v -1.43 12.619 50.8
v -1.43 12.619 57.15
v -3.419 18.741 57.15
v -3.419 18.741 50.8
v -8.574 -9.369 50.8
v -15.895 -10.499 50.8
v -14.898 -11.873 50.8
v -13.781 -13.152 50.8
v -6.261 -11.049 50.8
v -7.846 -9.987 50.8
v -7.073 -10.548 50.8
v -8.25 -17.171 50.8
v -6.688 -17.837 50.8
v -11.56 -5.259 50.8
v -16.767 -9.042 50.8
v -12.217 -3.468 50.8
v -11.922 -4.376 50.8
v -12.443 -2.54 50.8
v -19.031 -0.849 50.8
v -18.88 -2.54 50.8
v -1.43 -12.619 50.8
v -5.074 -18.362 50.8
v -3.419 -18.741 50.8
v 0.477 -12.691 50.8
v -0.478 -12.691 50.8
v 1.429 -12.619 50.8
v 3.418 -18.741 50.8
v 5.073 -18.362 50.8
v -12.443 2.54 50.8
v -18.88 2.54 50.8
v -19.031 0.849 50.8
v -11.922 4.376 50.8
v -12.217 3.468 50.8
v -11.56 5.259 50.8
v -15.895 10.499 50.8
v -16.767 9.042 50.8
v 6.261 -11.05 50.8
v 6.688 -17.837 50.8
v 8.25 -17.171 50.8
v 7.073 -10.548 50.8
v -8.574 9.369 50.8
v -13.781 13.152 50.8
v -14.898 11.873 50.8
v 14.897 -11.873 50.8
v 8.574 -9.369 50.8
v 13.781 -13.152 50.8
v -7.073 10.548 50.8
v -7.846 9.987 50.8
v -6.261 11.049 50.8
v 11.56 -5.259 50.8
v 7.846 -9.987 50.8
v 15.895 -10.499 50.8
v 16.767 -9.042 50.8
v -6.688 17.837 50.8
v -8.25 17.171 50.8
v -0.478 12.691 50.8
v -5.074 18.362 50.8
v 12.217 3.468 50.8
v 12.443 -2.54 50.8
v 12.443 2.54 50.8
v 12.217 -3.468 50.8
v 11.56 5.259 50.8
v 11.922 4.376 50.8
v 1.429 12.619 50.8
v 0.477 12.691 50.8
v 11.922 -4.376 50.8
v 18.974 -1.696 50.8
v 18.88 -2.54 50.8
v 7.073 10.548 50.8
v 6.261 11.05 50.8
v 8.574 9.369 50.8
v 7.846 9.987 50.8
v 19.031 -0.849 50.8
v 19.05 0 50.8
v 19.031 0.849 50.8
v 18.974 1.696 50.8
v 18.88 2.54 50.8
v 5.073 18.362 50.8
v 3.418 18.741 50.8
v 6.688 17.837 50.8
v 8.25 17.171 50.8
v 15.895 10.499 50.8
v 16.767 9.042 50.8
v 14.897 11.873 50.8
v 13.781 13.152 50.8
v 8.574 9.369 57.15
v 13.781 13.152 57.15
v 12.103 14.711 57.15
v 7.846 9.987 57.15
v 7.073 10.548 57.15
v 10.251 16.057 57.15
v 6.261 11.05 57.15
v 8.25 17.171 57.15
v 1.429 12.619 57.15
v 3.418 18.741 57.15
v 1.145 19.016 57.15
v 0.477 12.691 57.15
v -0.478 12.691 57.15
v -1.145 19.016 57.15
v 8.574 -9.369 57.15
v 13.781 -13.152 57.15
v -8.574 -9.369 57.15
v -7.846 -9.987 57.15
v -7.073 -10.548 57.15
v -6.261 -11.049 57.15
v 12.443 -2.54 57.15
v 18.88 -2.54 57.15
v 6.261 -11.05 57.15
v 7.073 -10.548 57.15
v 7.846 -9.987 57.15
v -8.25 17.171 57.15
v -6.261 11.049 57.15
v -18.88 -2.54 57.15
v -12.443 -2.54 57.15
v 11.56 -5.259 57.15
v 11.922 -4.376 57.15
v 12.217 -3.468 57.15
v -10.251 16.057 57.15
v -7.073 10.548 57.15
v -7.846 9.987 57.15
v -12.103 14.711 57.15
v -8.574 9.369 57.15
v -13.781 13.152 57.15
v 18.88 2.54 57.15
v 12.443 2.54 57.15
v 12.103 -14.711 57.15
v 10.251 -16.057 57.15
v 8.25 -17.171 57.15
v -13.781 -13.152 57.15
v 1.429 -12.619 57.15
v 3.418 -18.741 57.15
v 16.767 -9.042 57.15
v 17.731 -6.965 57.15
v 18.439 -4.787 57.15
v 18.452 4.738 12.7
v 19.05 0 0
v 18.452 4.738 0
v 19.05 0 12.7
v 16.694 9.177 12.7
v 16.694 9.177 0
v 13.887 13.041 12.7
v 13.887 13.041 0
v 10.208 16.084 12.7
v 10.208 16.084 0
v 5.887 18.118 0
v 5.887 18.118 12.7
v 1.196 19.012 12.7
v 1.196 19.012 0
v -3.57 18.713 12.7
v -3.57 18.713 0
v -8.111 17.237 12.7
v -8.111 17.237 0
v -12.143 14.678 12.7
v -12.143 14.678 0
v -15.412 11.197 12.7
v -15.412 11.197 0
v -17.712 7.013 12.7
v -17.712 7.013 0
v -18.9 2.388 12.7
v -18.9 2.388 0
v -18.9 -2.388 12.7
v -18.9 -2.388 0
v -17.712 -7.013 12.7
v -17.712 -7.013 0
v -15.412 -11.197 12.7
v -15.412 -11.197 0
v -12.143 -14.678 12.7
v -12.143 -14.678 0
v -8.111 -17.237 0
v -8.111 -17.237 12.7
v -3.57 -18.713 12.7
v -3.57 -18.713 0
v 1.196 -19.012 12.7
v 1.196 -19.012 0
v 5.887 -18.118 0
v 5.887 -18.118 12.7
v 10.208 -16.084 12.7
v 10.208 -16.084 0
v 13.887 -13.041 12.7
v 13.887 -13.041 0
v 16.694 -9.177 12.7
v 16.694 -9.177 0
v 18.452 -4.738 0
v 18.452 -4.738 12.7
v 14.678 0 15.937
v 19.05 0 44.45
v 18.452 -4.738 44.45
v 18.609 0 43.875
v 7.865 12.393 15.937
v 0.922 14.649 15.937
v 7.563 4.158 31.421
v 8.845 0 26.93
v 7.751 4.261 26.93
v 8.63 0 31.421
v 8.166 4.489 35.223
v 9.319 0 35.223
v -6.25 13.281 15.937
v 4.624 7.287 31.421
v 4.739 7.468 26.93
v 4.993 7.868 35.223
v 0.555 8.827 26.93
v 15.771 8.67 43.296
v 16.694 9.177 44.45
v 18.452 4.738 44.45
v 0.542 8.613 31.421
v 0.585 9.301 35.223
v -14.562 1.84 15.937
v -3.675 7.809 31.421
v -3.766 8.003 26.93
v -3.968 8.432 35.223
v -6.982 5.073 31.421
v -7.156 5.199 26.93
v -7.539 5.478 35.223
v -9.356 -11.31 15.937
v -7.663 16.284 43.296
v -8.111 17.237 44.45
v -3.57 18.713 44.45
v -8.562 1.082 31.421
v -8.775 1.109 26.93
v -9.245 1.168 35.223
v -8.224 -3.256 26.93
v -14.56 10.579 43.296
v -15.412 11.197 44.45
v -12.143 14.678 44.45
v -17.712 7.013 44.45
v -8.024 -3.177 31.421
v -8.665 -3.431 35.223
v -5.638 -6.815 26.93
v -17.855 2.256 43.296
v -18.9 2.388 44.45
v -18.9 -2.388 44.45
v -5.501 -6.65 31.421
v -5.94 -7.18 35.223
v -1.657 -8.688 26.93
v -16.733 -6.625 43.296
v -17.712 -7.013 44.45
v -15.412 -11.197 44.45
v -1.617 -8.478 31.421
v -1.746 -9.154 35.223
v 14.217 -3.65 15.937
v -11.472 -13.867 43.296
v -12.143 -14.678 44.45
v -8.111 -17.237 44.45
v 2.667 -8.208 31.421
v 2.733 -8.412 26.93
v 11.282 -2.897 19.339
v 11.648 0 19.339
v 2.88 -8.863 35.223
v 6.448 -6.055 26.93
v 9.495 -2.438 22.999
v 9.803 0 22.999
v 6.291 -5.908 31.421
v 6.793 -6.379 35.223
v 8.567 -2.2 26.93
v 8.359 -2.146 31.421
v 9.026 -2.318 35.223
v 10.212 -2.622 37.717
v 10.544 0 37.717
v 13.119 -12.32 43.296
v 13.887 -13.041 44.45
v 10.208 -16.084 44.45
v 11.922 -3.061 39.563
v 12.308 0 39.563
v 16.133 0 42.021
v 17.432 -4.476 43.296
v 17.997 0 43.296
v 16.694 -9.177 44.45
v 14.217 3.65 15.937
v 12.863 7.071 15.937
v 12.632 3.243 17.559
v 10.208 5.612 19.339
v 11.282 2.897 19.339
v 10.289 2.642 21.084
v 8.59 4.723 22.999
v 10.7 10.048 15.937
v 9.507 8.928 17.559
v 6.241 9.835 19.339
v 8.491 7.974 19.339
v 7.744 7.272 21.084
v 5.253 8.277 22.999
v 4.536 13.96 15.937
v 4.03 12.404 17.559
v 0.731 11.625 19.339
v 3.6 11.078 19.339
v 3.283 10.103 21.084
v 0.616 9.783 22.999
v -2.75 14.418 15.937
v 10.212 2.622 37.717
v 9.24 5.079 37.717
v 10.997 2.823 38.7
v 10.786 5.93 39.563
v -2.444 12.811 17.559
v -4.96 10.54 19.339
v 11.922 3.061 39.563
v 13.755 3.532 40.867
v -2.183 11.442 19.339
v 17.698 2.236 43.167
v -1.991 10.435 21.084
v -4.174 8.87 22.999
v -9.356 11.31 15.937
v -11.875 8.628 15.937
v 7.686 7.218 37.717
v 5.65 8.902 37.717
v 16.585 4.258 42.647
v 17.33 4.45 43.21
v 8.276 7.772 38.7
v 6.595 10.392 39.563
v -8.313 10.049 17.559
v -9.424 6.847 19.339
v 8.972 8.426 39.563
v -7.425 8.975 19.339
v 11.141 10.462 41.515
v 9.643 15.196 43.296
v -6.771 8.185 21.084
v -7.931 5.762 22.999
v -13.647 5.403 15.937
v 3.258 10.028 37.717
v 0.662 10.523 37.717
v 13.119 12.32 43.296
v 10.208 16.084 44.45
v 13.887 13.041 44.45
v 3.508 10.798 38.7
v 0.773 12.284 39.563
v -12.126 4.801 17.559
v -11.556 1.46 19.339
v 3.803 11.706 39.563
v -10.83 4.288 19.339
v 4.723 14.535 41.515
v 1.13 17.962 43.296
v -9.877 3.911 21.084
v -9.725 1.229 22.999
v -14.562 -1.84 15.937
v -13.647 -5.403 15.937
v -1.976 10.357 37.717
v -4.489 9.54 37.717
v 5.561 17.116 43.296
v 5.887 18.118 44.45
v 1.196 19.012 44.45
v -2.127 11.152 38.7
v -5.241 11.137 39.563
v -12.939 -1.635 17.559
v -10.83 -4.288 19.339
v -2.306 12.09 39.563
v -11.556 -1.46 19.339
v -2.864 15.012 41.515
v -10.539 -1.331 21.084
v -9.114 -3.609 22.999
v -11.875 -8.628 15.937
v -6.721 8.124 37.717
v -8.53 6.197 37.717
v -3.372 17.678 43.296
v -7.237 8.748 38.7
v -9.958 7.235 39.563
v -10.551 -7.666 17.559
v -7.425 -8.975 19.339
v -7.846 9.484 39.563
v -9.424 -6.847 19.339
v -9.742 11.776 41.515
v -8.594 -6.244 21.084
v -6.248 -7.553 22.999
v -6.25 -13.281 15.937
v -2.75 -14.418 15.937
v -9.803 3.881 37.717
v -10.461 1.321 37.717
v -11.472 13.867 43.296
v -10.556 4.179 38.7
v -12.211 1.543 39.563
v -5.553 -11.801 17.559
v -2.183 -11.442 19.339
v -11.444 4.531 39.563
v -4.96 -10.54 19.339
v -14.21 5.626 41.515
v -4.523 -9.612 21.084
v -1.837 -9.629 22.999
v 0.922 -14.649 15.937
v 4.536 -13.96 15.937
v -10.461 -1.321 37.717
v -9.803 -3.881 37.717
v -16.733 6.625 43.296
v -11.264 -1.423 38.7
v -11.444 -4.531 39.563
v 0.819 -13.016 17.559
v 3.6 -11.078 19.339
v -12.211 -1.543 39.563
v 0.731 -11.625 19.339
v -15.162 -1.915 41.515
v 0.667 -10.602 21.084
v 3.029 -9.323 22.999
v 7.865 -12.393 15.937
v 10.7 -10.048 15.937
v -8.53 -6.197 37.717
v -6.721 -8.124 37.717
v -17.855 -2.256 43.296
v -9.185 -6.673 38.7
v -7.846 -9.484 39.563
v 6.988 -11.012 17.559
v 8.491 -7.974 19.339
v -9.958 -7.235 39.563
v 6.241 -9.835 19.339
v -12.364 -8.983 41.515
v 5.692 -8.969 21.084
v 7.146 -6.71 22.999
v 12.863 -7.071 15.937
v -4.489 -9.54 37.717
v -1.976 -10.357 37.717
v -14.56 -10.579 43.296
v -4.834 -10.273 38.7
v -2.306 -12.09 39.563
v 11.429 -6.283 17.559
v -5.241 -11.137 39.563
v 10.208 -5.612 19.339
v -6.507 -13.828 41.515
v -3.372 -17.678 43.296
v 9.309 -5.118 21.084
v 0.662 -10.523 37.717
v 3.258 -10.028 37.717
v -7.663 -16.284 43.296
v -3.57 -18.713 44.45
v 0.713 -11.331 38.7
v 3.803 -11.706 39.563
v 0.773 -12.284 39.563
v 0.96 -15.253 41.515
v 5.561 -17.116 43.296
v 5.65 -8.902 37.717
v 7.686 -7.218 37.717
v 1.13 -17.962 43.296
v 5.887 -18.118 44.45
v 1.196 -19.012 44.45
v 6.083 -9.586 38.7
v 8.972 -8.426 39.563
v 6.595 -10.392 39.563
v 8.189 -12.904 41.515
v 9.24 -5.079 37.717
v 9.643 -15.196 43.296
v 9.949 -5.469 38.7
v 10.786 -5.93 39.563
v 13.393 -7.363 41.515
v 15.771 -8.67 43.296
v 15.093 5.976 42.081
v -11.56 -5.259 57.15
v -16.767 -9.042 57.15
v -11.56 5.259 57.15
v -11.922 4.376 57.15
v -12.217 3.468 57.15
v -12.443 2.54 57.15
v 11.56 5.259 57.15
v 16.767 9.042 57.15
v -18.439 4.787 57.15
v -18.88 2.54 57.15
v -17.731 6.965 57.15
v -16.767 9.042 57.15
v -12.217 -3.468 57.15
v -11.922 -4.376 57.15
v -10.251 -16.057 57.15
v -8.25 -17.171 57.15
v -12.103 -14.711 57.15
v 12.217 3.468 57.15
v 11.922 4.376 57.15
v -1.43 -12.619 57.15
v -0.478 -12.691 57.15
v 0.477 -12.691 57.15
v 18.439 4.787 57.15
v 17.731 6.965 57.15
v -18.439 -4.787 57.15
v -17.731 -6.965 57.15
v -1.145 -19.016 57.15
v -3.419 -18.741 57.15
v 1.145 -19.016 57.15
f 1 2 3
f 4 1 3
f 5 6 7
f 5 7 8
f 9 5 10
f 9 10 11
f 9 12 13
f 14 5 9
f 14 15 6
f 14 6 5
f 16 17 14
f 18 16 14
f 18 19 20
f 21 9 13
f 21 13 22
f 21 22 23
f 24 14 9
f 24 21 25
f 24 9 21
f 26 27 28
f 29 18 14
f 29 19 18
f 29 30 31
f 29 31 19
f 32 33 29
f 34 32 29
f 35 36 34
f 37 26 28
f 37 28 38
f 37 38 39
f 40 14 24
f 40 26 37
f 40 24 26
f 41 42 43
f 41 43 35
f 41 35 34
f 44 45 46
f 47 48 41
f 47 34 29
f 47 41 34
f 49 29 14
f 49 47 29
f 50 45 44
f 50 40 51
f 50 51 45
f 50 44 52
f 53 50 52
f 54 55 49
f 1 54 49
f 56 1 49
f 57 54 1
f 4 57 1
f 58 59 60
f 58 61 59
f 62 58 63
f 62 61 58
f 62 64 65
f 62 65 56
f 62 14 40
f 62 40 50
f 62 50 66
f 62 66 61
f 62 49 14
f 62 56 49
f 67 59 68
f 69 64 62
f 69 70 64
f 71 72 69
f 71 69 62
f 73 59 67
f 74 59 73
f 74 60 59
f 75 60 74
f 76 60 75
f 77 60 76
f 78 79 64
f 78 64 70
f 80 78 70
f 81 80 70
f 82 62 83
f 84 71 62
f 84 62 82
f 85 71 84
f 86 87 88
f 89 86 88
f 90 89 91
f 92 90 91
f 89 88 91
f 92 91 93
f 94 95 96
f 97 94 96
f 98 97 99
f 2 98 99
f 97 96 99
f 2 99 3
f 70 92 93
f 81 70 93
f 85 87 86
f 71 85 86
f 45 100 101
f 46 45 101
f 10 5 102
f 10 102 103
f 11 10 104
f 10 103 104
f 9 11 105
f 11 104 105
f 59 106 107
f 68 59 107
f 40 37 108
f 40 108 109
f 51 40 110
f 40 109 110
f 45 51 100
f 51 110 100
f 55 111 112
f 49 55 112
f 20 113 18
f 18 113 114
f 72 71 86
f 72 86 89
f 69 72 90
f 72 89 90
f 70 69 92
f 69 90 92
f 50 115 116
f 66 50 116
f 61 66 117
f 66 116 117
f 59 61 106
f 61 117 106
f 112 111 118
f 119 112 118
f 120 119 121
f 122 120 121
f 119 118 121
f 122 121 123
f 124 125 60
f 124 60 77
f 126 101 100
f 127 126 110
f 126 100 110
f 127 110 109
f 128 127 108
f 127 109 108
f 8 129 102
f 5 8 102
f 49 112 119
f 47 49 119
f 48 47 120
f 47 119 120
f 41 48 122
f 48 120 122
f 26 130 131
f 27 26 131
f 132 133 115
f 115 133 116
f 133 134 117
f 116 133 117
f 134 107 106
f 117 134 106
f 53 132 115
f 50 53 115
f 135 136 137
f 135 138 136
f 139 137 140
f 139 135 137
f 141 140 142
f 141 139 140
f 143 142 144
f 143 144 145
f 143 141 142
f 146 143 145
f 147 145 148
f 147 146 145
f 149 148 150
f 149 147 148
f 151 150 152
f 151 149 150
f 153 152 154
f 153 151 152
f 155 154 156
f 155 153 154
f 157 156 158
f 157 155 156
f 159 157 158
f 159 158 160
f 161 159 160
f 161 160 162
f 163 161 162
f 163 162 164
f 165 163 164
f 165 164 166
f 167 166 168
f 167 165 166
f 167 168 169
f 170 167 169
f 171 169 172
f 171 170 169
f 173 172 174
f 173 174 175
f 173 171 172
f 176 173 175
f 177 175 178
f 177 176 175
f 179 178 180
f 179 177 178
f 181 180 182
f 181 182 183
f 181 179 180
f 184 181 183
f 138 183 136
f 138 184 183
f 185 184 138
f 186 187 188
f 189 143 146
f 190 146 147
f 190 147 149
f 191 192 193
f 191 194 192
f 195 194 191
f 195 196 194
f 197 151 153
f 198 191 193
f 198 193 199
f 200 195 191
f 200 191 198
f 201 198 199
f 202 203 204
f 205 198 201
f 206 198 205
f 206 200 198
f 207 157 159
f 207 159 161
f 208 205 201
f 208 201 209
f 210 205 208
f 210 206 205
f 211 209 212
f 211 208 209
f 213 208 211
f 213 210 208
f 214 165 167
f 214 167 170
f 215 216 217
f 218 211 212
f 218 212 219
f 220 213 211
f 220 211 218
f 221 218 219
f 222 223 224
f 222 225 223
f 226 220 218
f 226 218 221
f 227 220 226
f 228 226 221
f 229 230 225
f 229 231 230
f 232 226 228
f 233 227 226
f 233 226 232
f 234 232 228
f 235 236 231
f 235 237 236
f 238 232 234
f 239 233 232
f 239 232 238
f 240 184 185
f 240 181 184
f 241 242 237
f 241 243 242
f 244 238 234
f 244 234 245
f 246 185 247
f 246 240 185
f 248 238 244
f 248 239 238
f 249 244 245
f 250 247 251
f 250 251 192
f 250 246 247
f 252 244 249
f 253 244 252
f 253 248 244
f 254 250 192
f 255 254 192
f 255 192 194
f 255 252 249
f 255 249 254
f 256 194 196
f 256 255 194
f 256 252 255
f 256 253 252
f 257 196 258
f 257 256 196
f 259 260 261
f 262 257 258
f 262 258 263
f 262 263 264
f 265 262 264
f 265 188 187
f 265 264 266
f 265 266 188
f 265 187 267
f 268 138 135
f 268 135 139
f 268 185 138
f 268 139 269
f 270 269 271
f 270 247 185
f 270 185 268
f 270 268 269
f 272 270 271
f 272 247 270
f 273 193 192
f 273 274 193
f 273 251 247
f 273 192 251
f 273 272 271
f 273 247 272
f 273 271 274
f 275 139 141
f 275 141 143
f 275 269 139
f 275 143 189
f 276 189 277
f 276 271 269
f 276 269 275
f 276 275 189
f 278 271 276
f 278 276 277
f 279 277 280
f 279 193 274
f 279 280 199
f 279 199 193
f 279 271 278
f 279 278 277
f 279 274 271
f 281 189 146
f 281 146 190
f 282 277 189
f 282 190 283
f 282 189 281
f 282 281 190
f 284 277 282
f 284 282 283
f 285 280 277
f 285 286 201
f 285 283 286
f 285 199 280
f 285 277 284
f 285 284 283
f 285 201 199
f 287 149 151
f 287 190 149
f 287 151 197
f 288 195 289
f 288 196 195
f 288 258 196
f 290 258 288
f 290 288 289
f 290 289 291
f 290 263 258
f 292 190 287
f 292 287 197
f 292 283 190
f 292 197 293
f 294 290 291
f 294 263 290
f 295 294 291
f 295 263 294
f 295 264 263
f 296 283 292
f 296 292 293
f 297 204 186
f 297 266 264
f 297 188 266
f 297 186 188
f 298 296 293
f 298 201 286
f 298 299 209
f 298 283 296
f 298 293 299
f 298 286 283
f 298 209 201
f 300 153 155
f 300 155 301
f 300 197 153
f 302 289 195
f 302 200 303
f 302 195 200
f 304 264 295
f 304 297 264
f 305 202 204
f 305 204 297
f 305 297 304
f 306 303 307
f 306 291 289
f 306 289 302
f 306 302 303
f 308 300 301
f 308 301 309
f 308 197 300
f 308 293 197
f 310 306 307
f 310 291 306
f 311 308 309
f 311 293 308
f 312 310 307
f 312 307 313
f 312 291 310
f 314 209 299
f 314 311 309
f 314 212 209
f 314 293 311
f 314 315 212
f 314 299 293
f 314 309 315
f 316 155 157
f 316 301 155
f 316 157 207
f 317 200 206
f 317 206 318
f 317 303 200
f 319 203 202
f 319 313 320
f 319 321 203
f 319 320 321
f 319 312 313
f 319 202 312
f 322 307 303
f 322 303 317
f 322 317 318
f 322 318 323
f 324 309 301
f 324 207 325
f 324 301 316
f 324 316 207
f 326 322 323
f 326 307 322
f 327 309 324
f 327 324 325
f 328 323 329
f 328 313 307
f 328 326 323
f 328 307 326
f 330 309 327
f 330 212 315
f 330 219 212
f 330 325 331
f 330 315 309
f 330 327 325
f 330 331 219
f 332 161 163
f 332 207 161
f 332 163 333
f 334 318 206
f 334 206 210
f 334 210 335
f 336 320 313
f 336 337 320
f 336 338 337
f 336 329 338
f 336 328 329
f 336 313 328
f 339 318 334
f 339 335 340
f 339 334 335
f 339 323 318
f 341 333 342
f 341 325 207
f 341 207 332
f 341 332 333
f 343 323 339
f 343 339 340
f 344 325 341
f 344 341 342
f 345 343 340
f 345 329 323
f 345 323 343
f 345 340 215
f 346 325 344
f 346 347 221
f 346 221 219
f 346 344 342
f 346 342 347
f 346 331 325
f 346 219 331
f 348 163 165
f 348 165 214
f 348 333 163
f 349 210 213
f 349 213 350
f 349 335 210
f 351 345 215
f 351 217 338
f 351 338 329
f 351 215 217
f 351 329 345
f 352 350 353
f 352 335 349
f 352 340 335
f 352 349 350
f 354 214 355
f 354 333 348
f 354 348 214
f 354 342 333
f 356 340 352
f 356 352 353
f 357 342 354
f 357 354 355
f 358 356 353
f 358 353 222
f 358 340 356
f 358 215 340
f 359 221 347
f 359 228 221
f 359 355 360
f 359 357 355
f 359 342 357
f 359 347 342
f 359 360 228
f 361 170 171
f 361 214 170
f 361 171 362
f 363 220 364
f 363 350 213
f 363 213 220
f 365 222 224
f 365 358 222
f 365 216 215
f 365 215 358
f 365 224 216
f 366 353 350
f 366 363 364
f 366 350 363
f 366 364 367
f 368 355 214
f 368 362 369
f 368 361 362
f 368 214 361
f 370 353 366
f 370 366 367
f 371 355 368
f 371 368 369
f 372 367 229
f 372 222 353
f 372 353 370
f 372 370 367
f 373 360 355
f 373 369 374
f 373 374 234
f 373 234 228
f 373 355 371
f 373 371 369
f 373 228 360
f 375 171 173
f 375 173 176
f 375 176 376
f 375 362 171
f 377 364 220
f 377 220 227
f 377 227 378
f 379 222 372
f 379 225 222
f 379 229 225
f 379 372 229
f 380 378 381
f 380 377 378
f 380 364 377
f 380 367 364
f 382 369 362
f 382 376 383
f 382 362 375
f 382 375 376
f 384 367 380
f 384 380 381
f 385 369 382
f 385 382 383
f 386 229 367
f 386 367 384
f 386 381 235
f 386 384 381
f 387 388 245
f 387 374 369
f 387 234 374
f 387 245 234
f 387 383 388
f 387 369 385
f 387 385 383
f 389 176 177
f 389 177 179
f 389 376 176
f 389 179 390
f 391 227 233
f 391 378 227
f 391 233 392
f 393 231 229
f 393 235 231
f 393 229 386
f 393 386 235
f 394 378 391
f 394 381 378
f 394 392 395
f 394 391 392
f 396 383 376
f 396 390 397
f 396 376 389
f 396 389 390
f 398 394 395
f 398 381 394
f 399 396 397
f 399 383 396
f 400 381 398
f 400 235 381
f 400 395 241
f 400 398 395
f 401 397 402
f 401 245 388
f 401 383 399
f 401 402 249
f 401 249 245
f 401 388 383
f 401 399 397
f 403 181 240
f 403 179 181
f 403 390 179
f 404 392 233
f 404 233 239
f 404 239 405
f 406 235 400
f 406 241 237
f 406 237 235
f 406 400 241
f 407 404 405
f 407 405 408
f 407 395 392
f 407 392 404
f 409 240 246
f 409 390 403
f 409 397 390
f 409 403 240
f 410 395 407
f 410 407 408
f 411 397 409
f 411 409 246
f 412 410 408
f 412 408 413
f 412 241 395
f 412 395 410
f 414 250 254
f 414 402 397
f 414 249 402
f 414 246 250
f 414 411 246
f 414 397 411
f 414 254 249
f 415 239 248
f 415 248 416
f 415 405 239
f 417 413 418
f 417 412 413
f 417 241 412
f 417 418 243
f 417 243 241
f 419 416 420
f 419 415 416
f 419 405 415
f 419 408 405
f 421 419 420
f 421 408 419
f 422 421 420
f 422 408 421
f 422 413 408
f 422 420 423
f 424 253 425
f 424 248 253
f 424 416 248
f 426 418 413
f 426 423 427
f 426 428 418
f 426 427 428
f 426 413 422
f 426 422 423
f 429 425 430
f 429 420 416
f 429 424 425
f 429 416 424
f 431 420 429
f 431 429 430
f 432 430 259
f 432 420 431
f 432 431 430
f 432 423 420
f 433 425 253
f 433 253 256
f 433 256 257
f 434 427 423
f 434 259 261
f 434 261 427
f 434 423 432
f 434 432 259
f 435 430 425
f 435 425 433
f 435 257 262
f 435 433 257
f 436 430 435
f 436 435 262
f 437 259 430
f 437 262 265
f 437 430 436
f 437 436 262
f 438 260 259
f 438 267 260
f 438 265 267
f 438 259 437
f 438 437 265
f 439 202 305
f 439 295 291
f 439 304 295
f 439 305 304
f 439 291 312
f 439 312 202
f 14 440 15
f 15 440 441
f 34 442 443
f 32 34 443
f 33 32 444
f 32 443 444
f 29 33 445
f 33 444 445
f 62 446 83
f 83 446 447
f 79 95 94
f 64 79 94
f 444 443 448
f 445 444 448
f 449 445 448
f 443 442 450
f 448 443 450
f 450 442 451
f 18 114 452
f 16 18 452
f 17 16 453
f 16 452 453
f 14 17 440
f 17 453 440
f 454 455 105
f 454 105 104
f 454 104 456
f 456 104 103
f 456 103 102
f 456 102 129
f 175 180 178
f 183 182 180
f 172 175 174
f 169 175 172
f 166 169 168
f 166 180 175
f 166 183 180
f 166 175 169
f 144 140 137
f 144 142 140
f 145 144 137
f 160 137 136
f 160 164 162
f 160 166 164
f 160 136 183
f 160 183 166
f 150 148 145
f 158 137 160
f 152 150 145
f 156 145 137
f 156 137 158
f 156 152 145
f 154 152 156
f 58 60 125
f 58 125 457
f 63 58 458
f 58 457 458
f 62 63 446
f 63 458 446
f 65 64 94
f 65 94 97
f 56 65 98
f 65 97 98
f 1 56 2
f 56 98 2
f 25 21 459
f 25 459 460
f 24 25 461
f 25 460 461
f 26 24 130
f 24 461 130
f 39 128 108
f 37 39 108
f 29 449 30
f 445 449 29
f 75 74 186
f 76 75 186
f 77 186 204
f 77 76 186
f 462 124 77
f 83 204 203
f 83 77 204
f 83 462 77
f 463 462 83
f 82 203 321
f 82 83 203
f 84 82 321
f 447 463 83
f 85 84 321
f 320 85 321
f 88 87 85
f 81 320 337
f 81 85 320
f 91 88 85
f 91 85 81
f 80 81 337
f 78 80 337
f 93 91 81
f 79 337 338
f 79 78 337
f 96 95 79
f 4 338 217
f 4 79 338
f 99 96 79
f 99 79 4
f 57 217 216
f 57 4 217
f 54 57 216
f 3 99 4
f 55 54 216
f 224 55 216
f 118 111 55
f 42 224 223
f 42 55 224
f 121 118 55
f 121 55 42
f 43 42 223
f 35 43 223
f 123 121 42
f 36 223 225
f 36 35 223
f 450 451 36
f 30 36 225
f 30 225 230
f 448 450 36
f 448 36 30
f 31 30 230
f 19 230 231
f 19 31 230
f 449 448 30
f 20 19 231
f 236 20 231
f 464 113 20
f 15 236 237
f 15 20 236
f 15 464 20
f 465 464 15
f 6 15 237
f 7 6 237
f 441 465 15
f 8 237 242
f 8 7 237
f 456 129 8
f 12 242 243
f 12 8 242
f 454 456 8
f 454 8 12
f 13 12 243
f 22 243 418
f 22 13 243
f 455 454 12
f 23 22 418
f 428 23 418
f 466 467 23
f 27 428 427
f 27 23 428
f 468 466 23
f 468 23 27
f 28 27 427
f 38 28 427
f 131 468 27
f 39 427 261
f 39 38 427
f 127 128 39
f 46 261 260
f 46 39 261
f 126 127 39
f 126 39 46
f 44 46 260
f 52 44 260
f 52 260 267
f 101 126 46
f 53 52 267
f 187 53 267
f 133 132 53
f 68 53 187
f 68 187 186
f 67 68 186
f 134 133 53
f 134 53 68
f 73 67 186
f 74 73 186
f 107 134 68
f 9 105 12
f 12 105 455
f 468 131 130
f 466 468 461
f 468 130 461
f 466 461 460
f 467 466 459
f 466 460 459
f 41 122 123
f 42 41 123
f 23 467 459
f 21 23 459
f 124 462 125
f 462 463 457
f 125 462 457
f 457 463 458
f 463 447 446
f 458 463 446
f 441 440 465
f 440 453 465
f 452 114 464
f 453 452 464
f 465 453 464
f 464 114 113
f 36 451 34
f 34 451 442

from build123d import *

# Parameters (mm, degrees)
F0_W     = 19.05
F0_H     = 12.7
F2_R     = 12.7
F3_DEPTH = 6.35
F4_W     = 14.3478936436
F4_H     = 5.08
F5_DEPTH = 6.35


# Not quite as in the source:
# - a feature of the source that left no trace in its solid (it failed there, or was rolled back) is left out


with BuildPart() as f1:
    # F0 (on Front) → F1 (revolve)
    with BuildSketch(Plane.XZ):
        with Locations((9.525, 50.8)):
            Rectangle(F0_W, F0_H)
        with BuildLine():
            Line((0, 44.45), (0, 0))
            Line((0, 0), (19.05, 0))
            Line((19.05, 0), (19.05, 12.7))
            add(Edge.make_bspline(
                [(19.05, 12.7), (16.3044854864, 14.4605922783), (11.5816284357, 18.1369797007), (8.0678489786, 26.6218092545), (8.7605074506, 39.8132017689), (17.6573194939, 42.2227860015), (19.05, 44.45)],
                knots=[0, 0, 0, 0, 0.2386598147, 0.4768090303, 0.7479827182, 1, 1, 1, 1], degree=3))
            Line((19.05, 44.45), (0, 44.45))
        make_face()
    revolve(axis=Axis((0, 0, 28.575), (0, 0, 1)))

    # F2 (on face) → F3 (cut)
    with BuildSketch(Plane.XY.offset(57.15)):
        Circle(F2_R)
    extrude(amount=-F3_DEPTH, mode=Mode.SUBTRACT)

    # F4 (on face) → F5 (cut)
    with BuildSketch(Plane.XY.offset(57.15)):
        with Locations((19.05, 0)):
            Rectangle(F4_W, F4_H)
        Polygon((11.1008845043, 4.9257238661), (22.7085742955, 13.3592041513), (19.7226252138, 17.4690104828), (8.1149354226, 9.0355301976), align=None)
        Polygon((6.0855174874, 10.5099886346), (10.5192604568, 24.1556463795), (5.687893354, 25.7254527109), (1.2541503846, 12.079794966), align=None)
        Polygon((-1.2543481381, 12.079794966), (-5.6880911074, 25.7254527109), (-10.5194582102, 24.1556463795), (-6.0857152409, 10.5099886346), align=None)
        Polygon((-8.1151331761, 9.0355301976), (-19.7228229673, 17.4690104828), (-22.7087720489, 13.3592041513), (-11.1010822577, 4.9257238661), align=None)
        with Locations((-19.0501977534, 0)):
            Rectangle(F4_W, F4_H)
        Polygon((-11.1010822577, -4.9257238661), (-22.7087720489, -13.3592041513), (-19.7228229673, -17.4690104828), (-8.1151331761, -9.0355301976), align=None)
        Polygon((-6.0857152409, -10.5099886346), (-10.5194582102, -24.1556463795), (-5.6880911074, -25.7254527109), (-1.2543481381, -12.079794966), align=None)
        Polygon((1.2541503846, -12.079794966), (5.687893354, -25.7254527109), (10.5192604568, -24.1556463795), (6.0855174874, -10.5099886346), align=None)
        Polygon((8.1149354226, -9.0355301976), (19.7226252138, -17.4690104828), (22.7085742955, -13.3592041513), (11.1008845043, -4.9257238661), align=None)
    extrude(amount=-F5_DEPTH, mode=Mode.SUBTRACT)


solid = f1.part
